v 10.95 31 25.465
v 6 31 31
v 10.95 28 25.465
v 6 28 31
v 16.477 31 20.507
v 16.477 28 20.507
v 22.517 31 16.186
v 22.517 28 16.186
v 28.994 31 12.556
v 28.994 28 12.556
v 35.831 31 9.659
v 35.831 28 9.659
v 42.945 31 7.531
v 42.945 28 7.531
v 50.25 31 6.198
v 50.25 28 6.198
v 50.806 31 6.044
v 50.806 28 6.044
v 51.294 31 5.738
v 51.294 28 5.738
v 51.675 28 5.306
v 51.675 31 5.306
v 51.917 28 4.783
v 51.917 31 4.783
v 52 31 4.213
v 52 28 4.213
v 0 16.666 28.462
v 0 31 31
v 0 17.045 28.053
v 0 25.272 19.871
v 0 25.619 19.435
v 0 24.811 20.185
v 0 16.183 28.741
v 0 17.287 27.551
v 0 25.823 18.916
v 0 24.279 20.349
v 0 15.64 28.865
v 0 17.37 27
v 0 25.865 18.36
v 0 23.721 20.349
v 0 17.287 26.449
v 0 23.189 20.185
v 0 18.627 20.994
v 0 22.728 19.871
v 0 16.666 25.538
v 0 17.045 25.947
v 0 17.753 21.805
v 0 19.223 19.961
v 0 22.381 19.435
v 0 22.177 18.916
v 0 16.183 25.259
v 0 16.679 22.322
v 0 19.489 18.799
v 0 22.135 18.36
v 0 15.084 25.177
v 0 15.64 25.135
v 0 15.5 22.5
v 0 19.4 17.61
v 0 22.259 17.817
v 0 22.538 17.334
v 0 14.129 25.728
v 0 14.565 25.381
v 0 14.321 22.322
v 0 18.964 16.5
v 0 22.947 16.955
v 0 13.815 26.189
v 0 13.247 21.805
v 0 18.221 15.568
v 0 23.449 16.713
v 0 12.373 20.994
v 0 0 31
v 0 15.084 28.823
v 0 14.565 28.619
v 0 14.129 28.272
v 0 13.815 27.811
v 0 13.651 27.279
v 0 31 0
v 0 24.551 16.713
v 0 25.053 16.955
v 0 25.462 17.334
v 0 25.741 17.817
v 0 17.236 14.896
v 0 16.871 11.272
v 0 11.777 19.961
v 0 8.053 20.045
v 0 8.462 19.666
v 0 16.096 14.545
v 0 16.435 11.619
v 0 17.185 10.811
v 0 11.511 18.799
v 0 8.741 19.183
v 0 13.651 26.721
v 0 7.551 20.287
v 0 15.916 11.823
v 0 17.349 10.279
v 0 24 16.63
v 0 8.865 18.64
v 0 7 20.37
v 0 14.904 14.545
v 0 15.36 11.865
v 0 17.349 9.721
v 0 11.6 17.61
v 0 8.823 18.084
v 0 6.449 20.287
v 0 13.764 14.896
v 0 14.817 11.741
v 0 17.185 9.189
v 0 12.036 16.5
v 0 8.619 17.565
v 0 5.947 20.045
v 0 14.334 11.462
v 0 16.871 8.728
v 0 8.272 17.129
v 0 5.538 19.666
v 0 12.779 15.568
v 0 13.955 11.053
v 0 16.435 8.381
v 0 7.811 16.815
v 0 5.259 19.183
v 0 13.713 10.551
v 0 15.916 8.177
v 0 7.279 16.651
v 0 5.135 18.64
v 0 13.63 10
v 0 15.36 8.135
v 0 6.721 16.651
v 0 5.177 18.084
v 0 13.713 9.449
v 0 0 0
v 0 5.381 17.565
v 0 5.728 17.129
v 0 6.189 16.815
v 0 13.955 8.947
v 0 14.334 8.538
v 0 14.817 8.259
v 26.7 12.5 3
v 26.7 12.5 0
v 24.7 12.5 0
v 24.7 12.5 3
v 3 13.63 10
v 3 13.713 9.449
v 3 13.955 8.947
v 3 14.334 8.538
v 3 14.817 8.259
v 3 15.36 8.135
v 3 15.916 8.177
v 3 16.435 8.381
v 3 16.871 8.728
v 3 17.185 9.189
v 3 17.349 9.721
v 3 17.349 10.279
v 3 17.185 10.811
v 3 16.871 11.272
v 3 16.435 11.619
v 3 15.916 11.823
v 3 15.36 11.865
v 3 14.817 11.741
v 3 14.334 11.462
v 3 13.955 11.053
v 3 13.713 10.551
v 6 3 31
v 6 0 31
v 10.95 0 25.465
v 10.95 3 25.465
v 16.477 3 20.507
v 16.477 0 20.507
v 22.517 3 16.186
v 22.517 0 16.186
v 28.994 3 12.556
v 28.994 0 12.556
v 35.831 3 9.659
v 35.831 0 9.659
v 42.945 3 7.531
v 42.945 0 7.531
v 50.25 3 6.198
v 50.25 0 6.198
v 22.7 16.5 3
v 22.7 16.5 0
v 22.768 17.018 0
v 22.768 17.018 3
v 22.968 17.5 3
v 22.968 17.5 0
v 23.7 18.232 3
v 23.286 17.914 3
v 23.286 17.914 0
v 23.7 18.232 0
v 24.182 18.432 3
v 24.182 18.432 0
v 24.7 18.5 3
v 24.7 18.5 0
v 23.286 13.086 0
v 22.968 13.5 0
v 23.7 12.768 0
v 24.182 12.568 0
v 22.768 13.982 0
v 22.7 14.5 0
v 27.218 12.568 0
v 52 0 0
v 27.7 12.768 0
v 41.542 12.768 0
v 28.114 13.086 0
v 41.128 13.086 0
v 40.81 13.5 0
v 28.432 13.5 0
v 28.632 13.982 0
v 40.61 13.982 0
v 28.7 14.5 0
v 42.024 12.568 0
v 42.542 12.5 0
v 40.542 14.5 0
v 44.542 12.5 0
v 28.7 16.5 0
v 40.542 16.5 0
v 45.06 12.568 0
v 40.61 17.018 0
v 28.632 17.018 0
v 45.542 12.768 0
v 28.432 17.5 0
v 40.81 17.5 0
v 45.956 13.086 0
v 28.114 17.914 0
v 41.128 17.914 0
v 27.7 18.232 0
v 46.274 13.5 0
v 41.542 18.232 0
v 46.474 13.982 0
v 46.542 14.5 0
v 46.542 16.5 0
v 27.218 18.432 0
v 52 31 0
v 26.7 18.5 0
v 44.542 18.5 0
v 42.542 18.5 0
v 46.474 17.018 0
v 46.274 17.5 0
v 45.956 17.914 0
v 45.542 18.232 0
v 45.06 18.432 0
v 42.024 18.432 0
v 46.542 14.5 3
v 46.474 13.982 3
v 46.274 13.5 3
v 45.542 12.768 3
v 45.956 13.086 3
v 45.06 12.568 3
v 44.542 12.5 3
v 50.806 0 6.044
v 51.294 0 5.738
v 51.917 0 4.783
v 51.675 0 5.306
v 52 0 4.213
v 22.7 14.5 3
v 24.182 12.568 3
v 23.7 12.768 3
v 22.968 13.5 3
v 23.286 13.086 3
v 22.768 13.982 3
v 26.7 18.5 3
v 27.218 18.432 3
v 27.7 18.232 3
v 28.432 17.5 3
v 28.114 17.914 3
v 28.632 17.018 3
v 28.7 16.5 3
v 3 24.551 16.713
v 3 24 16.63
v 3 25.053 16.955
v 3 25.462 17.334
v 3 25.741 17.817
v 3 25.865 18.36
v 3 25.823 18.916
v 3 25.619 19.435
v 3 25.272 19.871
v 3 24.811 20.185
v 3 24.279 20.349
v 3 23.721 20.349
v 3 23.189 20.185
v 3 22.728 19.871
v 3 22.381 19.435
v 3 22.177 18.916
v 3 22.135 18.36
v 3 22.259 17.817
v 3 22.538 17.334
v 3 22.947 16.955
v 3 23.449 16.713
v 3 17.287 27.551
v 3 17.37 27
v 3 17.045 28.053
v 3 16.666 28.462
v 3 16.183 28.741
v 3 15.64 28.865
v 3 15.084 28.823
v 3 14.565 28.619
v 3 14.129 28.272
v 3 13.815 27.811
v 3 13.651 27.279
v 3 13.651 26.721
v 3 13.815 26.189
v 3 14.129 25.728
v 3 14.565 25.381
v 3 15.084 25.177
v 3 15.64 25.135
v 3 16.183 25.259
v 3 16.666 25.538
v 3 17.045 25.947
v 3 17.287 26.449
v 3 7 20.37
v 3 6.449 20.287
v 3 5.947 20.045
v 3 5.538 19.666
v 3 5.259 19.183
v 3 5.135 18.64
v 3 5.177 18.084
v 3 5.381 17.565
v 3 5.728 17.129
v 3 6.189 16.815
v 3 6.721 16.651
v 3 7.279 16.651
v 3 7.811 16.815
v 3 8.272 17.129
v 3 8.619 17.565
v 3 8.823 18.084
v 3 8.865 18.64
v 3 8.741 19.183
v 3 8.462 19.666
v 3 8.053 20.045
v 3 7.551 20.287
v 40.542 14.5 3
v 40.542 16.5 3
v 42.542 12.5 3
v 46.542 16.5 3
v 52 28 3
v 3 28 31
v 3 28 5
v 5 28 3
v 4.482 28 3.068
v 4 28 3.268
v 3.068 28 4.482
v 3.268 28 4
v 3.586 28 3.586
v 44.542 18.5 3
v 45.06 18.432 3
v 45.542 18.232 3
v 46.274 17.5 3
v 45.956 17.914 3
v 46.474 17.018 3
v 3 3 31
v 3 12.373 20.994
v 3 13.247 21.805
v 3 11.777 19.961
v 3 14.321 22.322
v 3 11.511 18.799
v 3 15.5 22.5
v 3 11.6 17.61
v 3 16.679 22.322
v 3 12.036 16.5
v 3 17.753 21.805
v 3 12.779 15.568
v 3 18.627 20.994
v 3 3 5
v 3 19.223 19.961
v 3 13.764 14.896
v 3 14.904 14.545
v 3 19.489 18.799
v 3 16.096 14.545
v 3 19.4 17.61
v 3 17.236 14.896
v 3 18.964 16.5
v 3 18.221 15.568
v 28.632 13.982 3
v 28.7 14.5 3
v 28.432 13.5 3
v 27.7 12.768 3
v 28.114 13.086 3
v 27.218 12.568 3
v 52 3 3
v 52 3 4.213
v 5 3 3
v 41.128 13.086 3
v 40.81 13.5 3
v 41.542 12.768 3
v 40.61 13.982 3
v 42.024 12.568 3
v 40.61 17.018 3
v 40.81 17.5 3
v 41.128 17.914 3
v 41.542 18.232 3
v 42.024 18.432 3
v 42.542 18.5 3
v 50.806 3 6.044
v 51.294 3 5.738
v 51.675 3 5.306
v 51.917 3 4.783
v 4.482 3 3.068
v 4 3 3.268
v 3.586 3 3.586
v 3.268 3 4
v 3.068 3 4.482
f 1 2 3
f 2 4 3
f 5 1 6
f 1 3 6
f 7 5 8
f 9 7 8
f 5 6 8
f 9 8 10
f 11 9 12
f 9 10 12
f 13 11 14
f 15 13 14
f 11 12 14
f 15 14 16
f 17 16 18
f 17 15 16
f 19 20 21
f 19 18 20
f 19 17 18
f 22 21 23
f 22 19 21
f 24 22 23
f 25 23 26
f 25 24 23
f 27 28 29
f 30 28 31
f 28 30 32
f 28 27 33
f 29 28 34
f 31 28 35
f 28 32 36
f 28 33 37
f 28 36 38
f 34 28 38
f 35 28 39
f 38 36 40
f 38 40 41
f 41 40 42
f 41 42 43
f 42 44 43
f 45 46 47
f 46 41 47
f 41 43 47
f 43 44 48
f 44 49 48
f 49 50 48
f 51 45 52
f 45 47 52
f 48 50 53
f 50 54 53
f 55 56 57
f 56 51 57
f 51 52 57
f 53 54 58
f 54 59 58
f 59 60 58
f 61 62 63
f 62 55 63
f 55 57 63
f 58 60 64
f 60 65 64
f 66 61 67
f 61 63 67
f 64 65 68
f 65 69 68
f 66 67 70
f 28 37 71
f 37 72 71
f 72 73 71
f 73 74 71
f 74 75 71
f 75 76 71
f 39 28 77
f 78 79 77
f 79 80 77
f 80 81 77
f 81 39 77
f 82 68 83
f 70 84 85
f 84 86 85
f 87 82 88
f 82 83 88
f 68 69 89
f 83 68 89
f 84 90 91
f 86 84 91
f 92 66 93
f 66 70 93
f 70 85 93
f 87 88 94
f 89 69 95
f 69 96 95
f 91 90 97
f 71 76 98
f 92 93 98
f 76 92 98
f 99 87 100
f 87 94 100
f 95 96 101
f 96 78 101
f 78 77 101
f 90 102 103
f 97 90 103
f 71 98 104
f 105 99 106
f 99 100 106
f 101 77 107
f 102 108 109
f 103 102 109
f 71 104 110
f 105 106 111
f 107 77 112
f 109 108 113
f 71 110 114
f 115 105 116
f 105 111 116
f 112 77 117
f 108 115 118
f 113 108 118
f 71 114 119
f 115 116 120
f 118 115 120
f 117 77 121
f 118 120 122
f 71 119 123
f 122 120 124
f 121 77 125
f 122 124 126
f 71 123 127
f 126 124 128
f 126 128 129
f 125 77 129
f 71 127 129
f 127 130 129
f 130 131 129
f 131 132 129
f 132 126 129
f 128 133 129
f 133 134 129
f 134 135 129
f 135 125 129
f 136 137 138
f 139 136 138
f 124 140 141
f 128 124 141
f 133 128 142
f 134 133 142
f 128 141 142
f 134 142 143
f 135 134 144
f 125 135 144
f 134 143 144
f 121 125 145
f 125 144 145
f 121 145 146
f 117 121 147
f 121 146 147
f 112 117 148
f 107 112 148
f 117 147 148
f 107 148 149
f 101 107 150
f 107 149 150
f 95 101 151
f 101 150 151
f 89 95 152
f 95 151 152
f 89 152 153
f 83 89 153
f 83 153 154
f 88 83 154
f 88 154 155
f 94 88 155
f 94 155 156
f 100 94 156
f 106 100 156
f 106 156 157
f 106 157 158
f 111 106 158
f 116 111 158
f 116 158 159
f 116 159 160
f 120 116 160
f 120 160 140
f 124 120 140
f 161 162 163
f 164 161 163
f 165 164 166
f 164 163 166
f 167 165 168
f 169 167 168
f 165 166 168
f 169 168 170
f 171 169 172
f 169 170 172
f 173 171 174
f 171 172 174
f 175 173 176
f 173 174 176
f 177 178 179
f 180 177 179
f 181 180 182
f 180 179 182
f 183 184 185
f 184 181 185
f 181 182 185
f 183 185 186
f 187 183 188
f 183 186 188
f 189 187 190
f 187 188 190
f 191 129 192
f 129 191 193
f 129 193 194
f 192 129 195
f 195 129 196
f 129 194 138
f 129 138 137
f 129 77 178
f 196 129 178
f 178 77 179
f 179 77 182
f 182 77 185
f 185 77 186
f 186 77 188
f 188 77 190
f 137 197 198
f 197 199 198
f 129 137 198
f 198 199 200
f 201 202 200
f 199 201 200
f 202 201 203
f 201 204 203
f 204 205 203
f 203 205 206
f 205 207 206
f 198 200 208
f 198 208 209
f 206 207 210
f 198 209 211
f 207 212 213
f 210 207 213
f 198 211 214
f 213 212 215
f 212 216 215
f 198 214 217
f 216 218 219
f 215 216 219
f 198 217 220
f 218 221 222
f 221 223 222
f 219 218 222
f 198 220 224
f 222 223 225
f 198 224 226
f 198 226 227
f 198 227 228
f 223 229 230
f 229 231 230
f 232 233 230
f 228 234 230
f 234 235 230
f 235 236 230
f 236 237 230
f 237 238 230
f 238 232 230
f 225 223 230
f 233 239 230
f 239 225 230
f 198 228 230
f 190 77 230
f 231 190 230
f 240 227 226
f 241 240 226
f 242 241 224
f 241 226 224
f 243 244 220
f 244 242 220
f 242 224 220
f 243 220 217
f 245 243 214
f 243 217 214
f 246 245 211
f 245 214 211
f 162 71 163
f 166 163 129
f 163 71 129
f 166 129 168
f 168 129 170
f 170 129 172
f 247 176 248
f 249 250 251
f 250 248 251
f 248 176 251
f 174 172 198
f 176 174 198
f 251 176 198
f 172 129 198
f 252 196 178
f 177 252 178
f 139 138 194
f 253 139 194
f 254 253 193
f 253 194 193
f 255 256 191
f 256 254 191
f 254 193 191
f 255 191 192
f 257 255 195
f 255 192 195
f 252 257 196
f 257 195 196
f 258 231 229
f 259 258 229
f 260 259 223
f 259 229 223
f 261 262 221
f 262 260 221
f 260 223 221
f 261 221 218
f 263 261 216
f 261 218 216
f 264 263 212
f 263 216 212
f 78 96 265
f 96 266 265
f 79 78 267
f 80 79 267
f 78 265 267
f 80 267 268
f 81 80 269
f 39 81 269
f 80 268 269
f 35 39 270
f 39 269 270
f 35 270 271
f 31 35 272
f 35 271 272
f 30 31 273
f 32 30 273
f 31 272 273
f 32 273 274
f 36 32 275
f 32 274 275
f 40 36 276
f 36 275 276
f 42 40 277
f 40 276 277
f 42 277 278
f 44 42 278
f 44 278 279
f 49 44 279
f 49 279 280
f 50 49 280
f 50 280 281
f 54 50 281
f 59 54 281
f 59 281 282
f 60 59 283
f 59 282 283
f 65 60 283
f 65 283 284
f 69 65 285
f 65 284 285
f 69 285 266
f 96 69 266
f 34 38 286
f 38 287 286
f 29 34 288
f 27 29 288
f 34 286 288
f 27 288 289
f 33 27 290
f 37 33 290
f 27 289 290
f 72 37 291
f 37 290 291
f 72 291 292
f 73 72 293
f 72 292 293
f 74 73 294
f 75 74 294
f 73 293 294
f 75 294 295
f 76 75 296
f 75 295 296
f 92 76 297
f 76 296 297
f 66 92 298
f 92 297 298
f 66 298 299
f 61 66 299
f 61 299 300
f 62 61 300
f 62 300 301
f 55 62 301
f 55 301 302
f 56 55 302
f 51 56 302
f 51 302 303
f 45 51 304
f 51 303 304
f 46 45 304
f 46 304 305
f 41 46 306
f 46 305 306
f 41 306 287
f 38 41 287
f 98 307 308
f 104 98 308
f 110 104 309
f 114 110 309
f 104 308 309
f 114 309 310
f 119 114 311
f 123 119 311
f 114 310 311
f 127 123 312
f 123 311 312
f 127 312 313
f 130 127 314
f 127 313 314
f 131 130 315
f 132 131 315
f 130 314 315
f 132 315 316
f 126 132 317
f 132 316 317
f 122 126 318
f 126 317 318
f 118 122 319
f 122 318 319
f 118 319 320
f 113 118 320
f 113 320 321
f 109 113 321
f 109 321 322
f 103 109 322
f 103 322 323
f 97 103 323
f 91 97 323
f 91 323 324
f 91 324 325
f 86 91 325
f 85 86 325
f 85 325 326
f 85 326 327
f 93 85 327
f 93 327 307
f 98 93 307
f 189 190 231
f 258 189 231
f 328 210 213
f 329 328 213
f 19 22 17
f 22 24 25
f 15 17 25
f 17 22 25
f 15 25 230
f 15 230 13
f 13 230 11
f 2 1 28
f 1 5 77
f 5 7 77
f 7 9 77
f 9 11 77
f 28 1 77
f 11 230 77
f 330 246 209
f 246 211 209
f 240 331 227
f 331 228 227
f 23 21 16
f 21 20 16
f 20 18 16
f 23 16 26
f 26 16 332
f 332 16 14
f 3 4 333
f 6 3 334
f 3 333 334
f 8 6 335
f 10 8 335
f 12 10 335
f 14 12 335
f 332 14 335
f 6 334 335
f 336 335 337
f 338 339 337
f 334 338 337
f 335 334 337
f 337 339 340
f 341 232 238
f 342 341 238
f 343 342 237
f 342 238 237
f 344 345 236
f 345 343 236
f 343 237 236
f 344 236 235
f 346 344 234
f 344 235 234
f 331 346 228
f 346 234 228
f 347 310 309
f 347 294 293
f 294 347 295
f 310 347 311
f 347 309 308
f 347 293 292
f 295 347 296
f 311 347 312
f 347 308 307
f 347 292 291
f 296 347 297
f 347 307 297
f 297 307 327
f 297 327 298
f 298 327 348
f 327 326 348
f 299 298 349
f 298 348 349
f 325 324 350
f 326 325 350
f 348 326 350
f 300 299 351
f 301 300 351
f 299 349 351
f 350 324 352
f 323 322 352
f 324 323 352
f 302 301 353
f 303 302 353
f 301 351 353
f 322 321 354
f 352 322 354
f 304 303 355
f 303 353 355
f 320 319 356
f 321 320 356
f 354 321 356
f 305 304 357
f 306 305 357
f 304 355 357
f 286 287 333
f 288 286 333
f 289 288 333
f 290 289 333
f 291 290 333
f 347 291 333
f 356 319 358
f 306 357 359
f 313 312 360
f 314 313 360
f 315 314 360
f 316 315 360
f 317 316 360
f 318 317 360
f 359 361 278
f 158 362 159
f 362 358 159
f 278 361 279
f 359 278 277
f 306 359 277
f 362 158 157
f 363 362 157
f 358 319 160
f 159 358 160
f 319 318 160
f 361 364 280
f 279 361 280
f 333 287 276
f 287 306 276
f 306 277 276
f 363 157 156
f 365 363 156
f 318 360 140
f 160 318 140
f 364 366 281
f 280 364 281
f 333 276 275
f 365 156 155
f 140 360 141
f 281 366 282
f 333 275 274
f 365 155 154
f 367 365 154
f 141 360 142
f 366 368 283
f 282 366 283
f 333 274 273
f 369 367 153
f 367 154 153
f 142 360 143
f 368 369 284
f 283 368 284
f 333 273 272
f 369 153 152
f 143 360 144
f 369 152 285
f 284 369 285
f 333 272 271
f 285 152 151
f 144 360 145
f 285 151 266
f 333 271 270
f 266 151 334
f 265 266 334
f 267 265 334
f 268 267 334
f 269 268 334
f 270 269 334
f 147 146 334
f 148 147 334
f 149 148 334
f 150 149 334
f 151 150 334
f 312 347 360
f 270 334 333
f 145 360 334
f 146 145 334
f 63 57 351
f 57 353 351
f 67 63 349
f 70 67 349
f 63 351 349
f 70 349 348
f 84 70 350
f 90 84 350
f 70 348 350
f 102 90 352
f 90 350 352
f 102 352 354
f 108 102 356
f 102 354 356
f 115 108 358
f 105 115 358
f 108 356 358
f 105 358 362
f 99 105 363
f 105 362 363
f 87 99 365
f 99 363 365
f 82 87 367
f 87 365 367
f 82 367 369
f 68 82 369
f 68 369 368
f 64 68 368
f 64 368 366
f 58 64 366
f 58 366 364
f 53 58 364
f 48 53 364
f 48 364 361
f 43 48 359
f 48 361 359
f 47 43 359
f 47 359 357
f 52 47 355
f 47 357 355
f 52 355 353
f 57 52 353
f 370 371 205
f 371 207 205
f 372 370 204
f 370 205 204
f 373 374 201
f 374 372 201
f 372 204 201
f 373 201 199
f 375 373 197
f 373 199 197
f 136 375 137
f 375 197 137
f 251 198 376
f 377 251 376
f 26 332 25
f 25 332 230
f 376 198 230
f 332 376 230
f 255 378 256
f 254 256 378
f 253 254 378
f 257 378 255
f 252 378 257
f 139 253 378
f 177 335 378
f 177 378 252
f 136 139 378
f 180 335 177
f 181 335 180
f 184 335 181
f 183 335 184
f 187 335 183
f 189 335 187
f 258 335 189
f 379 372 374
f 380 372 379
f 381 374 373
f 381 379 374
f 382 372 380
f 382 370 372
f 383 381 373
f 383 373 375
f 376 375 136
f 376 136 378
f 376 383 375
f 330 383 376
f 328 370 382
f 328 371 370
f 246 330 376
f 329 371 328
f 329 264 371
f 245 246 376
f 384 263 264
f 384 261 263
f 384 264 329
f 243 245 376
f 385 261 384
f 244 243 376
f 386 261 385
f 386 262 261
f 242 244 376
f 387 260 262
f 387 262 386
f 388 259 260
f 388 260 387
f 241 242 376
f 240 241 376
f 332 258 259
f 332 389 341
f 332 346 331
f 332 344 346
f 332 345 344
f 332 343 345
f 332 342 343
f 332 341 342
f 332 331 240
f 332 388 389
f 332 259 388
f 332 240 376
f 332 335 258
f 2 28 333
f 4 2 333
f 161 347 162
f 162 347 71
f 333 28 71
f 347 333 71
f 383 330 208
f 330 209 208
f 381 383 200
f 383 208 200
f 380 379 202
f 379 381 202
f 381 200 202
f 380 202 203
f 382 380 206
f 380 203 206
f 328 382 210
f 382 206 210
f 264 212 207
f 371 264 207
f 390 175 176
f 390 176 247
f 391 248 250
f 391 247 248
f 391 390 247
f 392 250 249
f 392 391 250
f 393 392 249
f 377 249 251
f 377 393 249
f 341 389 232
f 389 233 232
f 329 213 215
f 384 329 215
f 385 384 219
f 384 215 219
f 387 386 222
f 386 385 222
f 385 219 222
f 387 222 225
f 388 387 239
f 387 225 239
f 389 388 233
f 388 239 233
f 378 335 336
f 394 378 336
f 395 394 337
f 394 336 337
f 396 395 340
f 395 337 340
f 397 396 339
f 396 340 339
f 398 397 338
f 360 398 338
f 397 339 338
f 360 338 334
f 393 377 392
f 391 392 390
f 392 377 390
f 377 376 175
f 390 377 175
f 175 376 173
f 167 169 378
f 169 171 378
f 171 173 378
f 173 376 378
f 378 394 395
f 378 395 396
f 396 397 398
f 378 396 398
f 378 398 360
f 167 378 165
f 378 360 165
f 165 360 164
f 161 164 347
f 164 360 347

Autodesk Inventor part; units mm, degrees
ref_plane "YZ Plane" through (0, 0, 0) normal (1, 0, 0) x (0, 1, 0)
ref_plane "XZ Plane" through (0, 0, 0) normal (0, 1, 0) x (-1, 0, 0)
ref_plane "XY Plane" through (0, 0, 0) normal (0, 0, 1) x (1, 0, 0)
sketch "Sketch1" plane through (0, 0, 0) normal (0, 0, 1) x (1, 0, 0)
  line L0 (0, 0) -> (52, 0)
  line L1 (52, 0) -> (52, 31)
  line L2 (52, 31) -> (0, 31)
  line L3 (0, 31) -> (0, 0)
  line L4 (24.7, 18.5) -> (26.7, 18.5)
  line L5 (28.7, 16.5) -> (28.7, 14.5)
  line L6 (26.7, 12.5) -> (24.7, 12.5)
  line L7 (22.7, 14.5) -> (22.7, 16.5)
  arc A0 (22.7, 14.5) -> (24.7, 12.5) centre (24.7, 14.5) ccw
  arc A1 (24.7, 18.5) -> (22.7, 16.5) centre (24.7, 16.5) ccw
  arc A2 (28.7, 16.5) -> (26.7, 18.5) centre (26.7, 16.5) ccw
  arc A3 (26.7, 12.5) -> (28.7, 14.5) centre (26.7, 14.5) ccw
  line L8 (42.542, 18.5) -> (44.542, 18.5)
  line L9 (46.542, 16.5) -> (46.542, 14.5)
  line L10 (44.542, 12.5) -> (42.542, 12.5)
  line L11 (40.542, 14.5) -> (40.542, 16.5)
  arc A4 (40.542, 14.5) -> (42.542, 12.5) centre (42.542, 14.5) ccw
  arc A5 (42.542, 18.5) -> (40.542, 16.5) centre (42.542, 16.5) ccw
  arc A6 (46.542, 16.5) -> (44.542, 18.5) centre (44.542, 16.5) ccw
  arc A7 (44.542, 12.5) -> (46.542, 14.5) centre (44.542, 14.5) ccw
  point P0 (28.7, 12.5)
  point P1 (28.7, 18.5)
  point P2 (22.7, 12.5)
  point P3 (22.7, 15.5)
  point P4 (0, 15.5)
  point P5 (46.542, 12.5)
  point P6 (46.542, 18.5)
  point P7 (40.542, 12.5)
  point P8 (40.542, 15.5)
  point P9 (28.7, 15.5)
  dimension "d0" = 52
  dimension "d1" = 31
  dimension "d2" = 6
  dimension "d3" = 6
  dimension "d4" = 2
  dimension "d5" = 22.7
  dimension "d6" = 6
  dimension "d7" = 6
  dimension "d8" = 2
  dimension "d9" = 5.458
extrude "Extrusion1" add sketch "Sketch1" along normal blind 3
sketch "Sketch2" plane through (0, 0, 3) normal (0, 0, 1) x (1, 0, 0)
  line L0 (0, 31) -> (0, 0) construction
  line L1 (52, 31) -> (0, 31) construction
  line L2 (0, 0) -> (3, 0)
  line L3 (3, 0) -> (3, 31)
  line L4 (3, 31) -> (0, 31)
  line L5 (0, 31) -> (0, 0)
  dimension "d12" = 3
extrude "Extrusion2" add sketch "Sketch2" along normal blind 28
fillet "Fillet1" radius 2 1 edges at (3, 15.5, 3)
sketch "Sketch4" plane through (0, 0, 0) normal (-1, 0, 0) x (0, 0, 1)
  point P0 (0, 0)
  point P1 (18.5, 15.5)
  point P2 (31, 15.5)
  dimension "d40" = 12.5
hole "Hole1" at (0, 15.5, 18.5) direction (1, 0, 0) diameter 8 end through all
sketch "Sketch5" plane through (0, 0, 0) normal (-1, 0, 0) x (0, 0, 1)
  line L0 (0, 31) -> (0, 0) construction
  circle A0 centre (18.5, 15.5) radius 4 construction
  point P0 (18.5, 7)
  dimension "d28" = 8.5
hole "Hole2" at (0, 7, 18.5) direction (1, 0, 0) diameter 3.74 end through all
pattern_circular "Circular Pattern1" count 4 over 360 about axis through (68.0147, 15.5, 18.5) along (-1, 0, 0) of "Hole2"
sketch "Sketch7" plane through (3, 0, 31) normal (1, 0, 0) x (0, 0, -1)
  line L0 (0, 0) -> (31, 0)
  line L1 (31, 0) -> (31, 3)
  line L2 (31, 3) -> (0, 3)
  line L3 (0, 3) -> (0, 0)
  line L4 (0, 28) -> (31, 28)
  line L5 (31, 28) -> (31, 31)
  line L6 (31, 31) -> (0, 31)
  line L7 (0, 31) -> (0, 28)
  point P0 (31, 0)
  dimension "d41" = 3
  dimension "d42" = 3
extrude "Extrusion4" add sketch "Sketch7" along normal up to surface (49 mm away)
sketch "Sketch8" plane through (0, 0, 0) normal (0, -1, 0) x (1, 0, 0)
  line L0 (3, 31) -> (6, 31) construction
  line L1 (52, 3) -> (52, 6) construction
  arc A0 (6, 31) -> (52, 6) centre (58.6945, 73.1378) ccw
  line L2 (6, 31) -> (52, 31)
  line L3 (52, 31) -> (52, 6)
  point P0 (0, 0)
  dimension "d45" = 3
  dimension "d46" = 3
  dimension "d47" = 67.4708
extrude "Extrusion5" cut sketch "Sketch8" against normal up to surface (31 mm away)
fillet "Fillet2" radius 2 2 edges at (52, 1.5, 6) (52, 29.5, 6)
properties part number "sujetador del motor"
